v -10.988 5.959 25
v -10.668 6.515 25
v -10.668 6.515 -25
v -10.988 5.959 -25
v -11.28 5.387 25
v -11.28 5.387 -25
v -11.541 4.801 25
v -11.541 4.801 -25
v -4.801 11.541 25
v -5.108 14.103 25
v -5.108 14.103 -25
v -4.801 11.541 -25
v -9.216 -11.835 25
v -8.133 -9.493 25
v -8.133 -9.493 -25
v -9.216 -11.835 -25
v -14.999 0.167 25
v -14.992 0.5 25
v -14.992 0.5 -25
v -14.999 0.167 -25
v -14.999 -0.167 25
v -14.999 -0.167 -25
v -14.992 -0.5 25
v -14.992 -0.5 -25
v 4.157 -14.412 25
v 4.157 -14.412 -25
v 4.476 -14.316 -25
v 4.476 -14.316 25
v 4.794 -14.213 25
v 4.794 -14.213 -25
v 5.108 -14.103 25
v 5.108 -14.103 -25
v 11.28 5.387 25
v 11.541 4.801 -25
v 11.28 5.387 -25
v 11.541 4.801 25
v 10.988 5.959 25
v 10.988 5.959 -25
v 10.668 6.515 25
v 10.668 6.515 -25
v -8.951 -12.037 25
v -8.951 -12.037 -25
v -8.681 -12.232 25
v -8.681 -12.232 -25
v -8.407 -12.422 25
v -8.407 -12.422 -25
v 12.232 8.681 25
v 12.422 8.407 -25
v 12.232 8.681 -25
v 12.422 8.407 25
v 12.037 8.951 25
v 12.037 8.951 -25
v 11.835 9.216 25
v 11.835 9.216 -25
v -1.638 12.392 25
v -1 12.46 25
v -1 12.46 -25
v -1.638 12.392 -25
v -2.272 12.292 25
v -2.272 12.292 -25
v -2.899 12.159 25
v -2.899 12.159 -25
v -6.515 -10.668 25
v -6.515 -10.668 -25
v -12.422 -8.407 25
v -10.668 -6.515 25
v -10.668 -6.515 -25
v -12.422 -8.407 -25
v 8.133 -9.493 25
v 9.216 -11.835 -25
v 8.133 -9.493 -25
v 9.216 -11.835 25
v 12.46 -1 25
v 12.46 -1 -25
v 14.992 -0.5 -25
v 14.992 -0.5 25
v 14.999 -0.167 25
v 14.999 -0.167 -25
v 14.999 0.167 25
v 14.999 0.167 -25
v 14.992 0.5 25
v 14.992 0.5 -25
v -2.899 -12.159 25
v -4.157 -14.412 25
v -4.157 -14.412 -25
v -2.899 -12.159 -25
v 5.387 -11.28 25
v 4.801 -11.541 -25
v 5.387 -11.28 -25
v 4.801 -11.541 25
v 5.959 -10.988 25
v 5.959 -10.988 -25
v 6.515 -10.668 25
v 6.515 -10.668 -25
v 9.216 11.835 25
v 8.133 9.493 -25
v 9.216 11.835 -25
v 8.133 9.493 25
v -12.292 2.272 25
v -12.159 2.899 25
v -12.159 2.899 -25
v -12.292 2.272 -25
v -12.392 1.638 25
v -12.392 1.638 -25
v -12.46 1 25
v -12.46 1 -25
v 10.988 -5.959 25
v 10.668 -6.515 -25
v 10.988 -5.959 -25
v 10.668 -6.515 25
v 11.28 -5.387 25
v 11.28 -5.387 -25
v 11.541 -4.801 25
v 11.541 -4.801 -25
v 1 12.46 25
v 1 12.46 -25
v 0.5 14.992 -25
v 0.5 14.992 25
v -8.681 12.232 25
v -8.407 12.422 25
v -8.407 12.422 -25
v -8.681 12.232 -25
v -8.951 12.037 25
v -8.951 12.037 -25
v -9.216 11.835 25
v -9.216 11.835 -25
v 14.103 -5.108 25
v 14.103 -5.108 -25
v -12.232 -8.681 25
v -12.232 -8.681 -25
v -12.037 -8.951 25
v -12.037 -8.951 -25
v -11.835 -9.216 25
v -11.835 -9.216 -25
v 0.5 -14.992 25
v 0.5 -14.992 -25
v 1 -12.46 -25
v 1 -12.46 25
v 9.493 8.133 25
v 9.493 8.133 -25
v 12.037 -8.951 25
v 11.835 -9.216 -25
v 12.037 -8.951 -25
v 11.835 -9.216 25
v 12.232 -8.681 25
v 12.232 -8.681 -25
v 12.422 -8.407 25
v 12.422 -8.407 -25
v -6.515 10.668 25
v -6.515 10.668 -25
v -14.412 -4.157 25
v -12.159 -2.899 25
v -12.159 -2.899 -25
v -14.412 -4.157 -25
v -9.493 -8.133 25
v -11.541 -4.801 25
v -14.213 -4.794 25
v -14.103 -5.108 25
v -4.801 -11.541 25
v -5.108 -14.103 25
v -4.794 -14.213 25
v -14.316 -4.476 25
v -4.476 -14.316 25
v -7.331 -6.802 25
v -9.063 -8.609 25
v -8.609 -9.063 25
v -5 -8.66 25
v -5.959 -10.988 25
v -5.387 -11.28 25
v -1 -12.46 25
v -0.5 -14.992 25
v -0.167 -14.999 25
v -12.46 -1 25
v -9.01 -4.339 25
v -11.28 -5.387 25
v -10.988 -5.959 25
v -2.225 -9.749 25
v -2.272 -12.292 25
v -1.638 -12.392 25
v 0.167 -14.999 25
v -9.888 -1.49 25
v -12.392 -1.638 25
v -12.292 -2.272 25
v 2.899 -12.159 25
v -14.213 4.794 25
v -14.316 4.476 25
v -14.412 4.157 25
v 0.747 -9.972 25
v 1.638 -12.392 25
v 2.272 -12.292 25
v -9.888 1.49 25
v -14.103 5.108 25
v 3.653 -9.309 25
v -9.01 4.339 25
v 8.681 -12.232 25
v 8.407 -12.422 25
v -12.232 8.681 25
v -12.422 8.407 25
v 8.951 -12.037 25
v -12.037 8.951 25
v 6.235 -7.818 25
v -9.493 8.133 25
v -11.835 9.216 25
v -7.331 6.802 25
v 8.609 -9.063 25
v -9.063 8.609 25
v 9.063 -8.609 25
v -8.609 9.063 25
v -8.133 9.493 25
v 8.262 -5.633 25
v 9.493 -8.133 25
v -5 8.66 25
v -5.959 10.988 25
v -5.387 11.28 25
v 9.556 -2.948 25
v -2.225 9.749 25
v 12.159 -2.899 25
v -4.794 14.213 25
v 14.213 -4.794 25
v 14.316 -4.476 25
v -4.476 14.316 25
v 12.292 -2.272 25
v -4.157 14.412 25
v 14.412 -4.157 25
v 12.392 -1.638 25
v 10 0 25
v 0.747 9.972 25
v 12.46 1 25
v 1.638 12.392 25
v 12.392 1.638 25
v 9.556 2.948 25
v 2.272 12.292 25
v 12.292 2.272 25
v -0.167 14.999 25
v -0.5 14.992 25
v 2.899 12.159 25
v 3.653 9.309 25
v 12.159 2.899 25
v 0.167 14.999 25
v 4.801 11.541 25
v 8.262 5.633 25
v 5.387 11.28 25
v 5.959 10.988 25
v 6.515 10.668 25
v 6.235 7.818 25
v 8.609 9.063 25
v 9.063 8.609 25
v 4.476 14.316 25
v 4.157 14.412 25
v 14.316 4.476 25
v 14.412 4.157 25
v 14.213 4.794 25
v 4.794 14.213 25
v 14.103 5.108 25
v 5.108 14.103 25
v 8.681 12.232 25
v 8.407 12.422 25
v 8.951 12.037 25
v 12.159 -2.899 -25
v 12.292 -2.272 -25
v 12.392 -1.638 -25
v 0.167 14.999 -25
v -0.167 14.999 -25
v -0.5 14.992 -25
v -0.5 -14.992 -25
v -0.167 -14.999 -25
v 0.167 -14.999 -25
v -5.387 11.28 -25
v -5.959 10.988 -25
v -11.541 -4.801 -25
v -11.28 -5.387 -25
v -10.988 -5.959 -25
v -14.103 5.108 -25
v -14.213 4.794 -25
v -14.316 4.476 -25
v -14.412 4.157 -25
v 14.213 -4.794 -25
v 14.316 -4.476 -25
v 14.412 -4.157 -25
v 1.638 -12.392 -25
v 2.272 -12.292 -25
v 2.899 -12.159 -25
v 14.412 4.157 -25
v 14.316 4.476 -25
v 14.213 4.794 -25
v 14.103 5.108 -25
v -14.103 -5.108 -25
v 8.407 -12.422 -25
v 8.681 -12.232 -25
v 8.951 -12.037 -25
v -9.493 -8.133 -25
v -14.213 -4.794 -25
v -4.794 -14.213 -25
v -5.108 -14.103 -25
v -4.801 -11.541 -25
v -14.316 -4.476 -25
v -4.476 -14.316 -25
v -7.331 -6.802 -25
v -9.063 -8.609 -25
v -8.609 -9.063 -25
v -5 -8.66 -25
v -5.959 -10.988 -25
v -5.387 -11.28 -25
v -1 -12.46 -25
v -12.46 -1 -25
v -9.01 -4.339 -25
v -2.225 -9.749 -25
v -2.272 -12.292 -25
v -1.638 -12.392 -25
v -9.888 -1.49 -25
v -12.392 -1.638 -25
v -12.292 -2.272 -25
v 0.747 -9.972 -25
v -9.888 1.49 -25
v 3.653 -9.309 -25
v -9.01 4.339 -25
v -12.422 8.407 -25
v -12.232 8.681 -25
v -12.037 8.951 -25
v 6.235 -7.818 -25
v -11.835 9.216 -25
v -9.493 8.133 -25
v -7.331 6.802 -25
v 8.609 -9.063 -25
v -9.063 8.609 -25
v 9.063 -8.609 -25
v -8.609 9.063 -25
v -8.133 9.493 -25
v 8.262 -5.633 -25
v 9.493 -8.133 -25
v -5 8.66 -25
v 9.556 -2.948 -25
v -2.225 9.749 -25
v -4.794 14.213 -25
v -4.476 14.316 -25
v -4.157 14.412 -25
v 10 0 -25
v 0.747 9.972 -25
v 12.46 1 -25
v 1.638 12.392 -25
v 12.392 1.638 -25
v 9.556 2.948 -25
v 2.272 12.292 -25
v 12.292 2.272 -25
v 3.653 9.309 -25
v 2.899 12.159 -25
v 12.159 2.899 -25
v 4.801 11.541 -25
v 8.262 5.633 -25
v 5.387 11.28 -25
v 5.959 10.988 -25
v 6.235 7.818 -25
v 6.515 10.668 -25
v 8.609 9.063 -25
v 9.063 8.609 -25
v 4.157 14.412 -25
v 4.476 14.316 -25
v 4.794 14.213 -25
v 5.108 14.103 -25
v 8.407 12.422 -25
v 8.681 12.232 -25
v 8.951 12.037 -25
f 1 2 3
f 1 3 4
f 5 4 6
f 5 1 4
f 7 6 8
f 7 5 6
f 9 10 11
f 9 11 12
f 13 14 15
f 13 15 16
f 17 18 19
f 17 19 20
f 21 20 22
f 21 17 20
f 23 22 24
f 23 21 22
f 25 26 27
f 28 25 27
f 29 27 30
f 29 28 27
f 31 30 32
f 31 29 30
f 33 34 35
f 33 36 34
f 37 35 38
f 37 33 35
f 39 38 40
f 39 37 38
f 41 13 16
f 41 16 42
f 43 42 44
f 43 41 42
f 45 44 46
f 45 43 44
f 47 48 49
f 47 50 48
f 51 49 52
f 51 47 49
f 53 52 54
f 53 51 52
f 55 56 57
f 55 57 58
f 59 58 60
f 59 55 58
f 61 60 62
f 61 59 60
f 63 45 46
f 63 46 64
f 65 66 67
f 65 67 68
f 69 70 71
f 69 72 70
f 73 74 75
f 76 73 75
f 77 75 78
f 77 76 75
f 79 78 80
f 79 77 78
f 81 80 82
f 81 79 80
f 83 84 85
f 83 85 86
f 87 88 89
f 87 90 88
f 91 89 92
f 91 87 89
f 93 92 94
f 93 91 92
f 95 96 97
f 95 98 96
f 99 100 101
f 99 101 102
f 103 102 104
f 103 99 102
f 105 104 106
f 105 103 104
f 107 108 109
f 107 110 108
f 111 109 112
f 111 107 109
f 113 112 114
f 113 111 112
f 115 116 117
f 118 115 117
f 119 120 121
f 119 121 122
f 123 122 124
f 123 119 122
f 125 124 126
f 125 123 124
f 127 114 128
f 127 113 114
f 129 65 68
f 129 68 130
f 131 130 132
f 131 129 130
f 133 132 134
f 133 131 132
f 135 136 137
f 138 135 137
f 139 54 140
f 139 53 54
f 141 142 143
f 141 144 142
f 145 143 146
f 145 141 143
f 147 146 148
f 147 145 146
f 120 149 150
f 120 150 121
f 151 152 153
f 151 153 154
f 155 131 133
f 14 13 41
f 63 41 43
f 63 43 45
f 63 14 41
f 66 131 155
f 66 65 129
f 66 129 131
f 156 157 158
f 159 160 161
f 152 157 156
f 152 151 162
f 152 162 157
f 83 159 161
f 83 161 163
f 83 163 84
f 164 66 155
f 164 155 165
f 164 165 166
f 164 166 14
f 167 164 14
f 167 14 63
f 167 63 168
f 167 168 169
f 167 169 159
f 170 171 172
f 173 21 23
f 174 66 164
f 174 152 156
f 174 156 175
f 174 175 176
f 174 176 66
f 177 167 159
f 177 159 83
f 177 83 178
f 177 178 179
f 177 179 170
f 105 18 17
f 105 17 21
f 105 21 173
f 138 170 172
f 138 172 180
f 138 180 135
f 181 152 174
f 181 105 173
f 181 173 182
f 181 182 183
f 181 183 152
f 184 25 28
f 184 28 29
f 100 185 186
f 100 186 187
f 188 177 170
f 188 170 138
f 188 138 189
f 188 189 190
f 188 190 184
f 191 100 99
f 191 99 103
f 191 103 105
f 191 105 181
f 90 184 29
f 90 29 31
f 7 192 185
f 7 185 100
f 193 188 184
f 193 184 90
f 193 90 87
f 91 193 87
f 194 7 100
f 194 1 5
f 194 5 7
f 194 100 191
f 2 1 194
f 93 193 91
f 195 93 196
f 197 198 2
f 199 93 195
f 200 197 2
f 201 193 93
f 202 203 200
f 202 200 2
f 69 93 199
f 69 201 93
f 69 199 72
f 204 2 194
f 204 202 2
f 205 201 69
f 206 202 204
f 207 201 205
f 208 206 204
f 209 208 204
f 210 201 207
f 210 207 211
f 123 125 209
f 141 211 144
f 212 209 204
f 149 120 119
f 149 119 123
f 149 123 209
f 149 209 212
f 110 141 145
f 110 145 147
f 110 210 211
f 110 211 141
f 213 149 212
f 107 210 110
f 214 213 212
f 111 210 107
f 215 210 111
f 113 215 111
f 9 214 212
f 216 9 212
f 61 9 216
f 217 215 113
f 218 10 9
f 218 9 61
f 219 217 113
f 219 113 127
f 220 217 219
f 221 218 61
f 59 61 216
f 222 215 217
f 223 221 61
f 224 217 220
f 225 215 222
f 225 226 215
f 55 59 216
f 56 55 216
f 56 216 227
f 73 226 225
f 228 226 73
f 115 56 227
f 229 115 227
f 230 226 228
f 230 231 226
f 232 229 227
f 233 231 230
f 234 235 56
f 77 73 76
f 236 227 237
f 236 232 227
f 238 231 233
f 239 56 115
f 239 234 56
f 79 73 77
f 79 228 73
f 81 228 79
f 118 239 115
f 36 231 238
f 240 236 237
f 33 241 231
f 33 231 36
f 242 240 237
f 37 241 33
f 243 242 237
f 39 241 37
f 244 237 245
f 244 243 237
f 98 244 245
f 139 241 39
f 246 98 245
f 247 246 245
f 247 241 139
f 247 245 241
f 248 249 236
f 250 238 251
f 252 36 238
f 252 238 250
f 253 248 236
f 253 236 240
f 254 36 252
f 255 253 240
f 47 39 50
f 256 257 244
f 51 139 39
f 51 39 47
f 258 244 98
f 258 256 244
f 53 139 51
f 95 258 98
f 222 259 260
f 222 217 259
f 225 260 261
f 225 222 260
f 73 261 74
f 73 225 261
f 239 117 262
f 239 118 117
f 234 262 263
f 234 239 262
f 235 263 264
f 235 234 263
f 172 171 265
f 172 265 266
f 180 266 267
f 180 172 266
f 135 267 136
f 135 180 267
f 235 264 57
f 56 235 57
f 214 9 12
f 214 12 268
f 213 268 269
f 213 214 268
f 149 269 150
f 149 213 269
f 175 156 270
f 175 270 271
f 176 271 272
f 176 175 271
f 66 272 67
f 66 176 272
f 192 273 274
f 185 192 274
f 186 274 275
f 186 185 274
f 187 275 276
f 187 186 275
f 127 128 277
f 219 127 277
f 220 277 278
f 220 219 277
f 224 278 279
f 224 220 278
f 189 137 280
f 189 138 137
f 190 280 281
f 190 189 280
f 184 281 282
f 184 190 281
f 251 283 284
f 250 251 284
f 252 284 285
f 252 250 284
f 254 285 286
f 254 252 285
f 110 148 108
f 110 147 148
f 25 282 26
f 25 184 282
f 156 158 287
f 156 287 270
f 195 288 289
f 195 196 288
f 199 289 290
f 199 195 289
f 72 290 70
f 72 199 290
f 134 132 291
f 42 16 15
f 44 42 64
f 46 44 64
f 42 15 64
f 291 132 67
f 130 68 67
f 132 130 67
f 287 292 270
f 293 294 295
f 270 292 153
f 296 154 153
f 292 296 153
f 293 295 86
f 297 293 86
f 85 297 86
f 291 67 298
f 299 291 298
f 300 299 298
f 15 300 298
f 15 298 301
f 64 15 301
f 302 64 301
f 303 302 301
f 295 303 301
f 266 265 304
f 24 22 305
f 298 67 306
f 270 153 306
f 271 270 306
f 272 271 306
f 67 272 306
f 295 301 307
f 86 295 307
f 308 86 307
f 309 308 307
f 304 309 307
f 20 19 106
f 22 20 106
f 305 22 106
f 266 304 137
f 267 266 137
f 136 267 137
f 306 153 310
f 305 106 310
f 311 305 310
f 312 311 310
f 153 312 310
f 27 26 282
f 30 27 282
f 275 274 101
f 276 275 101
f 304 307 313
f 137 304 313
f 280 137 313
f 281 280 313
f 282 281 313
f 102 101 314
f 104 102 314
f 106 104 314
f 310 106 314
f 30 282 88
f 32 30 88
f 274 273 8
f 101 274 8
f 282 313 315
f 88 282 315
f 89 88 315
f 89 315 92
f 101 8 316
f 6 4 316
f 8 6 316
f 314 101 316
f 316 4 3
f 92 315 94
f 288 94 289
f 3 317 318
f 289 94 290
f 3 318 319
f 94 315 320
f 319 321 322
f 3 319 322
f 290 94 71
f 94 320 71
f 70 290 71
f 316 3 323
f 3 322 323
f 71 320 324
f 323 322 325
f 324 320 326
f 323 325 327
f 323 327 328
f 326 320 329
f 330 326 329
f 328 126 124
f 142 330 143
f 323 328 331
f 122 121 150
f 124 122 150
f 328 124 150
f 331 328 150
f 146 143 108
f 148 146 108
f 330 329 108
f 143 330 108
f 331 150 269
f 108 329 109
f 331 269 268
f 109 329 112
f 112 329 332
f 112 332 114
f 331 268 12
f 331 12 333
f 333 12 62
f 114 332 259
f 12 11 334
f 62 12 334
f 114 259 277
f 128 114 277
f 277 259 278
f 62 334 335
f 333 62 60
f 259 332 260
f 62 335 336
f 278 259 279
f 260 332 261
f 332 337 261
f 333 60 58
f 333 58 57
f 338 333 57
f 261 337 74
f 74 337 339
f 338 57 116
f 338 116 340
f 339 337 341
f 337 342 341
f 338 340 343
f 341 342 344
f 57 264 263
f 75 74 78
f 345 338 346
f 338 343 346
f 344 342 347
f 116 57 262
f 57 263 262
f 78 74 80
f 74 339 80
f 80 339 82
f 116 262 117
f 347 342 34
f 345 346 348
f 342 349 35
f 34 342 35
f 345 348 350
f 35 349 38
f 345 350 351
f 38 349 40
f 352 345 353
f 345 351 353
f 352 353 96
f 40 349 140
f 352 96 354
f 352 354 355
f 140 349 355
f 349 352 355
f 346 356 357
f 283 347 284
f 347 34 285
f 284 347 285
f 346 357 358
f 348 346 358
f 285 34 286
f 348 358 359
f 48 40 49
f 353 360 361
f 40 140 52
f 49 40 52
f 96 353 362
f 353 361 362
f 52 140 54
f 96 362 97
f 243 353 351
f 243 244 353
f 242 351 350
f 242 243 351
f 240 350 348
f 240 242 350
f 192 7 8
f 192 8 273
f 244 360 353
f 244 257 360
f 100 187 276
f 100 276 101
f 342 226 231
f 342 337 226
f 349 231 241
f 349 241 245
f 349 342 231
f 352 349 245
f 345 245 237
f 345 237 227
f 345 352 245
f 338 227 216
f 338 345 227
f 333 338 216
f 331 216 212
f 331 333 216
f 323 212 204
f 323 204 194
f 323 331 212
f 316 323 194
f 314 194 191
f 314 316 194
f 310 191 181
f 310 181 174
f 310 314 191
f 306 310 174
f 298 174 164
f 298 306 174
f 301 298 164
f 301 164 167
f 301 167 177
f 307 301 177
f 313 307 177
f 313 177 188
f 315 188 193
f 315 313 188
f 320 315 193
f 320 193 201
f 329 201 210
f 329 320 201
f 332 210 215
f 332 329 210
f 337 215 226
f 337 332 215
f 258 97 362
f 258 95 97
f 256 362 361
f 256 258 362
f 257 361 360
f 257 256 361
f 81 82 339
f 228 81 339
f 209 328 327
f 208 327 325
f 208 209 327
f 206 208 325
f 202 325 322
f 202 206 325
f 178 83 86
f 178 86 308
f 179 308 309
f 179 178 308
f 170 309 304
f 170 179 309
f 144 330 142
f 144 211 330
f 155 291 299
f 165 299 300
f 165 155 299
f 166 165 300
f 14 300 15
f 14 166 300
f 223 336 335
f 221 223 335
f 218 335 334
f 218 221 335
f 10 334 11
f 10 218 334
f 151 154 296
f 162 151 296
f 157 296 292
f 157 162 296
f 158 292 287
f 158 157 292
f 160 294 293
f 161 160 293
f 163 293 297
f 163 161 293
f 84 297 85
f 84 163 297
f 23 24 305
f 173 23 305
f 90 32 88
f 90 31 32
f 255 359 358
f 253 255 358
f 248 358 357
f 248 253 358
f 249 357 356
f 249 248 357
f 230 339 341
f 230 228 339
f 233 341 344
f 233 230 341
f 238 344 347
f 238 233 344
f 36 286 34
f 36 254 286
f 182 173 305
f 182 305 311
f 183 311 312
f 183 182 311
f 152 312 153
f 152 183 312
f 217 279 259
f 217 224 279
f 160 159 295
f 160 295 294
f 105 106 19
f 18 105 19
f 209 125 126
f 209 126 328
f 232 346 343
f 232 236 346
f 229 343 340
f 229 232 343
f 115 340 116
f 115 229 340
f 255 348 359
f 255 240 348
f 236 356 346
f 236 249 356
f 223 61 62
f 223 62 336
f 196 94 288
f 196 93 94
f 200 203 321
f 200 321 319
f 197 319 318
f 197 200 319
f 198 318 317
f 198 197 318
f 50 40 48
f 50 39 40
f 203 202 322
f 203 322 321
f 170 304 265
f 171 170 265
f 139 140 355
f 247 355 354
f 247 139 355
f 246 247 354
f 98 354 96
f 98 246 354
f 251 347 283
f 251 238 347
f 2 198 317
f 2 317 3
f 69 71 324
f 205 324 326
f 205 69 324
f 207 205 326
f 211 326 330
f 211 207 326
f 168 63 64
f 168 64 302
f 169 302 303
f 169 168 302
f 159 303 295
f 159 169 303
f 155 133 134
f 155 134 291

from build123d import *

# Parameters (mm, degrees)
SKETCH1_R           = 10
BOSS_EXTRUDE1_DEPTH = 25


with BuildPart() as part:
    # Sketch1 → Boss-Extrude1 (new, symmetric)
    with BuildSketch(Plane.XY):
        with BuildLine():
            Line((-0.5, 14.991664351), (-1, 12.459935794))
            ThreePointArc((-1, 12.459935794), (-1.955430813, 12.346104257), (-2.899275393, 12.159120124))
            Line((-2.899275393, 12.159120124), (-4.1571508, 14.412428568))
            ThreePointArc((-4.1571508, 14.412428568), (-4.635254916, 14.265847744), (-5.108207316, 14.103411574))
            Line((-5.108207316, 14.103411574), (-4.801388426, 11.541086135))
            ThreePointArc((-4.801388426, 11.541086135), (-5.674881247, 11.137581552), (-6.51474951, 10.668085059))
            Line((-6.51474951, 10.668085059), (-8.407370715, 12.42240386))
            ThreePointArc((-8.407370715, 12.42240386), (-8.816778784, 12.135254916), (-9.21638771, 11.834618607))
            Line((-9.21638771, 11.834618607), (-8.132783499, 9.492514554))
            ThreePointArc((-8.132783499, 9.492514554), (-8.838834765, 8.838834765), (-9.492514554, 8.132783499))
            Line((-9.492514554, 8.132783499), (-11.834618607, 9.21638771))
            ThreePointArc((-11.834618607, 9.21638771), (-12.135254916, 8.816778784), (-12.42240386, 8.407370715))
            Line((-12.42240386, 8.407370715), (-10.668085059, 6.51474951))
            ThreePointArc((-10.668085059, 6.51474951), (-11.137581552, 5.674881247), (-11.541086135, 4.801388426))
            Line((-11.541086135, 4.801388426), (-14.103411574, 5.108207316))
            ThreePointArc((-14.103411574, 5.108207316), (-14.265847744, 4.635254916), (-14.412428568, 4.1571508))
            Line((-14.412428568, 4.1571508), (-12.159120124, 2.899275393))
            ThreePointArc((-12.159120124, 2.899275393), (-12.346104257, 1.955430813), (-12.459935794, 1))
            Line((-12.459935794, 1), (-14.991664351, 0.5))
            ThreePointArc((-14.991664351, 0.5), (-15, 0), (-14.991664351, -0.5))
            Line((-14.991664351, -0.5), (-12.459935794, -1))
            ThreePointArc((-12.459935794, -1), (-12.346104257, -1.955430813), (-12.159120124, -2.899275393))
            Line((-12.159120124, -2.899275393), (-14.412428568, -4.1571508))
            ThreePointArc((-14.412428568, -4.1571508), (-14.265847744, -4.635254916), (-14.103411574, -5.108207316))
            Line((-14.103411574, -5.108207316), (-11.541086135, -4.801388426))
            ThreePointArc((-11.541086135, -4.801388426), (-11.137581552, -5.674881247), (-10.668085059, -6.51474951))
            Line((-10.668085059, -6.51474951), (-12.42240386, -8.407370715))
            ThreePointArc((-12.42240386, -8.407370715), (-12.135254916, -8.816778784), (-11.834618607, -9.21638771))
            Line((-11.834618607, -9.21638771), (-9.492514554, -8.132783499))
            ThreePointArc((-9.492514554, -8.132783499), (-8.838834765, -8.838834765), (-8.132783499, -9.492514554))
            Line((-8.132783499, -9.492514554), (-9.21638771, -11.834618607))
            ThreePointArc((-9.21638771, -11.834618607), (-8.816778784, -12.135254916), (-8.407370715, -12.42240386))
            Line((-8.407370715, -12.42240386), (-6.51474951, -10.668085059))
            ThreePointArc((-6.51474951, -10.668085059), (-5.674881247, -11.137581552), (-4.801388426, -11.541086135))
            Line((-4.801388426, -11.541086135), (-5.108207316, -14.103411574))
            ThreePointArc((-5.108207316, -14.103411574), (-4.635254916, -14.265847744), (-4.1571508, -14.412428568))
            Line((-4.1571508, -14.412428568), (-2.899275393, -12.159120124))
            ThreePointArc((-2.899275393, -12.159120124), (-1.955430813, -12.346104257), (-1, -12.459935794))
            Line((-1, -12.459935794), (-0.5, -14.991664351))
            ThreePointArc((-0.5, -14.991664351), (0, -15), (0.5, -14.991664351))
            Line((0.5, -14.991664351), (1, -12.459935794))
            ThreePointArc((1, -12.459935794), (1.955430813, -12.346104257), (2.899275393, -12.159120124))
            Line((2.899275393, -12.159120124), (4.1571508, -14.412428568))
            ThreePointArc((4.1571508, -14.412428568), (4.635254916, -14.265847744), (5.108207316, -14.103411574))
            Line((5.108207316, -14.103411574), (4.801388426, -11.541086135))
            ThreePointArc((4.801388426, -11.541086135), (5.674881247, -11.137581552), (6.51474951, -10.668085059))
            Line((6.51474951, -10.668085059), (8.407370715, -12.42240386))
            ThreePointArc((8.407370715, -12.42240386), (8.816778784, -12.135254916), (9.21638771, -11.834618607))
            Line((9.21638771, -11.834618607), (8.132783499, -9.492514554))
            ThreePointArc((8.132783499, -9.492514554), (8.838834765, -8.838834765), (9.492514554, -8.132783499))
            Line((9.492514554, -8.132783499), (11.834618607, -9.21638771))
            ThreePointArc((11.834618607, -9.21638771), (12.135254916, -8.816778784), (12.42240386, -8.407370715))
            Line((12.42240386, -8.407370715), (10.668085059, -6.51474951))
            ThreePointArc((10.668085059, -6.51474951), (11.137581552, -5.674881247), (11.541086135, -4.801388426))
            Line((11.541086135, -4.801388426), (14.103411574, -5.108207316))
            ThreePointArc((14.103411574, -5.108207316), (14.265847744, -4.635254916), (14.412428568, -4.1571508))
            Line((14.412428568, -4.1571508), (12.159120124, -2.899275393))
            ThreePointArc((12.159120124, -2.899275393), (12.346104257, -1.955430813), (12.459935794, -1))
            Line((12.459935794, -1), (14.991664351, -0.5))
            ThreePointArc((14.991664351, -0.5), (15, 0), (14.991664351, 0.5))
            Line((14.991664351, 0.5), (12.459935794, 1))
            ThreePointArc((12.459935794, 1), (12.346104257, 1.955430813), (12.159120124, 2.899275393))
            Line((12.159120124, 2.899275393), (14.412428568, 4.1571508))
            ThreePointArc((14.412428568, 4.1571508), (14.265847744, 4.635254916), (14.103411574, 5.108207316))
            Line((14.103411574, 5.108207316), (11.541086135, 4.801388426))
            ThreePointArc((11.541086135, 4.801388426), (11.137581552, 5.674881247), (10.668085059, 6.51474951))
            Line((10.668085059, 6.51474951), (12.42240386, 8.407370715))
            ThreePointArc((12.42240386, 8.407370715), (12.135254916, 8.816778784), (11.834618607, 9.21638771))
            Line((11.834618607, 9.21638771), (9.492514554, 8.132783499))
            ThreePointArc((9.492514554, 8.132783499), (8.838834765, 8.838834765), (8.132783499, 9.492514554))
            Line((8.132783499, 9.492514554), (9.21638771, 11.834618607))
            ThreePointArc((9.21638771, 11.834618607), (8.816778784, 12.135254916), (8.407370715, 12.42240386))
            Line((8.407370715, 12.42240386), (6.51474951, 10.668085059))
            ThreePointArc((6.51474951, 10.668085059), (5.674881247, 11.137581552), (4.801388426, 11.541086135))
            Line((4.801388426, 11.541086135), (5.108207316, 14.103411574))
            ThreePointArc((5.108207316, 14.103411574), (4.635254916, 14.265847744), (4.1571508, 14.412428568))
            Line((4.1571508, 14.412428568), (2.899275393, 12.159120124))
            ThreePointArc((2.899275393, 12.159120124), (1.955430813, 12.346104257), (1, 12.459935794))
            Line((1, 12.459935794), (0.5, 14.991664351))
            ThreePointArc((0.5, 14.991664351), (0, 15), (-0.5, 14.991664351))
        make_face()
        Circle(SKETCH1_R, mode=Mode.SUBTRACT)
    extrude(amount=BOSS_EXTRUDE1_DEPTH, both=True)


solid = part.part
